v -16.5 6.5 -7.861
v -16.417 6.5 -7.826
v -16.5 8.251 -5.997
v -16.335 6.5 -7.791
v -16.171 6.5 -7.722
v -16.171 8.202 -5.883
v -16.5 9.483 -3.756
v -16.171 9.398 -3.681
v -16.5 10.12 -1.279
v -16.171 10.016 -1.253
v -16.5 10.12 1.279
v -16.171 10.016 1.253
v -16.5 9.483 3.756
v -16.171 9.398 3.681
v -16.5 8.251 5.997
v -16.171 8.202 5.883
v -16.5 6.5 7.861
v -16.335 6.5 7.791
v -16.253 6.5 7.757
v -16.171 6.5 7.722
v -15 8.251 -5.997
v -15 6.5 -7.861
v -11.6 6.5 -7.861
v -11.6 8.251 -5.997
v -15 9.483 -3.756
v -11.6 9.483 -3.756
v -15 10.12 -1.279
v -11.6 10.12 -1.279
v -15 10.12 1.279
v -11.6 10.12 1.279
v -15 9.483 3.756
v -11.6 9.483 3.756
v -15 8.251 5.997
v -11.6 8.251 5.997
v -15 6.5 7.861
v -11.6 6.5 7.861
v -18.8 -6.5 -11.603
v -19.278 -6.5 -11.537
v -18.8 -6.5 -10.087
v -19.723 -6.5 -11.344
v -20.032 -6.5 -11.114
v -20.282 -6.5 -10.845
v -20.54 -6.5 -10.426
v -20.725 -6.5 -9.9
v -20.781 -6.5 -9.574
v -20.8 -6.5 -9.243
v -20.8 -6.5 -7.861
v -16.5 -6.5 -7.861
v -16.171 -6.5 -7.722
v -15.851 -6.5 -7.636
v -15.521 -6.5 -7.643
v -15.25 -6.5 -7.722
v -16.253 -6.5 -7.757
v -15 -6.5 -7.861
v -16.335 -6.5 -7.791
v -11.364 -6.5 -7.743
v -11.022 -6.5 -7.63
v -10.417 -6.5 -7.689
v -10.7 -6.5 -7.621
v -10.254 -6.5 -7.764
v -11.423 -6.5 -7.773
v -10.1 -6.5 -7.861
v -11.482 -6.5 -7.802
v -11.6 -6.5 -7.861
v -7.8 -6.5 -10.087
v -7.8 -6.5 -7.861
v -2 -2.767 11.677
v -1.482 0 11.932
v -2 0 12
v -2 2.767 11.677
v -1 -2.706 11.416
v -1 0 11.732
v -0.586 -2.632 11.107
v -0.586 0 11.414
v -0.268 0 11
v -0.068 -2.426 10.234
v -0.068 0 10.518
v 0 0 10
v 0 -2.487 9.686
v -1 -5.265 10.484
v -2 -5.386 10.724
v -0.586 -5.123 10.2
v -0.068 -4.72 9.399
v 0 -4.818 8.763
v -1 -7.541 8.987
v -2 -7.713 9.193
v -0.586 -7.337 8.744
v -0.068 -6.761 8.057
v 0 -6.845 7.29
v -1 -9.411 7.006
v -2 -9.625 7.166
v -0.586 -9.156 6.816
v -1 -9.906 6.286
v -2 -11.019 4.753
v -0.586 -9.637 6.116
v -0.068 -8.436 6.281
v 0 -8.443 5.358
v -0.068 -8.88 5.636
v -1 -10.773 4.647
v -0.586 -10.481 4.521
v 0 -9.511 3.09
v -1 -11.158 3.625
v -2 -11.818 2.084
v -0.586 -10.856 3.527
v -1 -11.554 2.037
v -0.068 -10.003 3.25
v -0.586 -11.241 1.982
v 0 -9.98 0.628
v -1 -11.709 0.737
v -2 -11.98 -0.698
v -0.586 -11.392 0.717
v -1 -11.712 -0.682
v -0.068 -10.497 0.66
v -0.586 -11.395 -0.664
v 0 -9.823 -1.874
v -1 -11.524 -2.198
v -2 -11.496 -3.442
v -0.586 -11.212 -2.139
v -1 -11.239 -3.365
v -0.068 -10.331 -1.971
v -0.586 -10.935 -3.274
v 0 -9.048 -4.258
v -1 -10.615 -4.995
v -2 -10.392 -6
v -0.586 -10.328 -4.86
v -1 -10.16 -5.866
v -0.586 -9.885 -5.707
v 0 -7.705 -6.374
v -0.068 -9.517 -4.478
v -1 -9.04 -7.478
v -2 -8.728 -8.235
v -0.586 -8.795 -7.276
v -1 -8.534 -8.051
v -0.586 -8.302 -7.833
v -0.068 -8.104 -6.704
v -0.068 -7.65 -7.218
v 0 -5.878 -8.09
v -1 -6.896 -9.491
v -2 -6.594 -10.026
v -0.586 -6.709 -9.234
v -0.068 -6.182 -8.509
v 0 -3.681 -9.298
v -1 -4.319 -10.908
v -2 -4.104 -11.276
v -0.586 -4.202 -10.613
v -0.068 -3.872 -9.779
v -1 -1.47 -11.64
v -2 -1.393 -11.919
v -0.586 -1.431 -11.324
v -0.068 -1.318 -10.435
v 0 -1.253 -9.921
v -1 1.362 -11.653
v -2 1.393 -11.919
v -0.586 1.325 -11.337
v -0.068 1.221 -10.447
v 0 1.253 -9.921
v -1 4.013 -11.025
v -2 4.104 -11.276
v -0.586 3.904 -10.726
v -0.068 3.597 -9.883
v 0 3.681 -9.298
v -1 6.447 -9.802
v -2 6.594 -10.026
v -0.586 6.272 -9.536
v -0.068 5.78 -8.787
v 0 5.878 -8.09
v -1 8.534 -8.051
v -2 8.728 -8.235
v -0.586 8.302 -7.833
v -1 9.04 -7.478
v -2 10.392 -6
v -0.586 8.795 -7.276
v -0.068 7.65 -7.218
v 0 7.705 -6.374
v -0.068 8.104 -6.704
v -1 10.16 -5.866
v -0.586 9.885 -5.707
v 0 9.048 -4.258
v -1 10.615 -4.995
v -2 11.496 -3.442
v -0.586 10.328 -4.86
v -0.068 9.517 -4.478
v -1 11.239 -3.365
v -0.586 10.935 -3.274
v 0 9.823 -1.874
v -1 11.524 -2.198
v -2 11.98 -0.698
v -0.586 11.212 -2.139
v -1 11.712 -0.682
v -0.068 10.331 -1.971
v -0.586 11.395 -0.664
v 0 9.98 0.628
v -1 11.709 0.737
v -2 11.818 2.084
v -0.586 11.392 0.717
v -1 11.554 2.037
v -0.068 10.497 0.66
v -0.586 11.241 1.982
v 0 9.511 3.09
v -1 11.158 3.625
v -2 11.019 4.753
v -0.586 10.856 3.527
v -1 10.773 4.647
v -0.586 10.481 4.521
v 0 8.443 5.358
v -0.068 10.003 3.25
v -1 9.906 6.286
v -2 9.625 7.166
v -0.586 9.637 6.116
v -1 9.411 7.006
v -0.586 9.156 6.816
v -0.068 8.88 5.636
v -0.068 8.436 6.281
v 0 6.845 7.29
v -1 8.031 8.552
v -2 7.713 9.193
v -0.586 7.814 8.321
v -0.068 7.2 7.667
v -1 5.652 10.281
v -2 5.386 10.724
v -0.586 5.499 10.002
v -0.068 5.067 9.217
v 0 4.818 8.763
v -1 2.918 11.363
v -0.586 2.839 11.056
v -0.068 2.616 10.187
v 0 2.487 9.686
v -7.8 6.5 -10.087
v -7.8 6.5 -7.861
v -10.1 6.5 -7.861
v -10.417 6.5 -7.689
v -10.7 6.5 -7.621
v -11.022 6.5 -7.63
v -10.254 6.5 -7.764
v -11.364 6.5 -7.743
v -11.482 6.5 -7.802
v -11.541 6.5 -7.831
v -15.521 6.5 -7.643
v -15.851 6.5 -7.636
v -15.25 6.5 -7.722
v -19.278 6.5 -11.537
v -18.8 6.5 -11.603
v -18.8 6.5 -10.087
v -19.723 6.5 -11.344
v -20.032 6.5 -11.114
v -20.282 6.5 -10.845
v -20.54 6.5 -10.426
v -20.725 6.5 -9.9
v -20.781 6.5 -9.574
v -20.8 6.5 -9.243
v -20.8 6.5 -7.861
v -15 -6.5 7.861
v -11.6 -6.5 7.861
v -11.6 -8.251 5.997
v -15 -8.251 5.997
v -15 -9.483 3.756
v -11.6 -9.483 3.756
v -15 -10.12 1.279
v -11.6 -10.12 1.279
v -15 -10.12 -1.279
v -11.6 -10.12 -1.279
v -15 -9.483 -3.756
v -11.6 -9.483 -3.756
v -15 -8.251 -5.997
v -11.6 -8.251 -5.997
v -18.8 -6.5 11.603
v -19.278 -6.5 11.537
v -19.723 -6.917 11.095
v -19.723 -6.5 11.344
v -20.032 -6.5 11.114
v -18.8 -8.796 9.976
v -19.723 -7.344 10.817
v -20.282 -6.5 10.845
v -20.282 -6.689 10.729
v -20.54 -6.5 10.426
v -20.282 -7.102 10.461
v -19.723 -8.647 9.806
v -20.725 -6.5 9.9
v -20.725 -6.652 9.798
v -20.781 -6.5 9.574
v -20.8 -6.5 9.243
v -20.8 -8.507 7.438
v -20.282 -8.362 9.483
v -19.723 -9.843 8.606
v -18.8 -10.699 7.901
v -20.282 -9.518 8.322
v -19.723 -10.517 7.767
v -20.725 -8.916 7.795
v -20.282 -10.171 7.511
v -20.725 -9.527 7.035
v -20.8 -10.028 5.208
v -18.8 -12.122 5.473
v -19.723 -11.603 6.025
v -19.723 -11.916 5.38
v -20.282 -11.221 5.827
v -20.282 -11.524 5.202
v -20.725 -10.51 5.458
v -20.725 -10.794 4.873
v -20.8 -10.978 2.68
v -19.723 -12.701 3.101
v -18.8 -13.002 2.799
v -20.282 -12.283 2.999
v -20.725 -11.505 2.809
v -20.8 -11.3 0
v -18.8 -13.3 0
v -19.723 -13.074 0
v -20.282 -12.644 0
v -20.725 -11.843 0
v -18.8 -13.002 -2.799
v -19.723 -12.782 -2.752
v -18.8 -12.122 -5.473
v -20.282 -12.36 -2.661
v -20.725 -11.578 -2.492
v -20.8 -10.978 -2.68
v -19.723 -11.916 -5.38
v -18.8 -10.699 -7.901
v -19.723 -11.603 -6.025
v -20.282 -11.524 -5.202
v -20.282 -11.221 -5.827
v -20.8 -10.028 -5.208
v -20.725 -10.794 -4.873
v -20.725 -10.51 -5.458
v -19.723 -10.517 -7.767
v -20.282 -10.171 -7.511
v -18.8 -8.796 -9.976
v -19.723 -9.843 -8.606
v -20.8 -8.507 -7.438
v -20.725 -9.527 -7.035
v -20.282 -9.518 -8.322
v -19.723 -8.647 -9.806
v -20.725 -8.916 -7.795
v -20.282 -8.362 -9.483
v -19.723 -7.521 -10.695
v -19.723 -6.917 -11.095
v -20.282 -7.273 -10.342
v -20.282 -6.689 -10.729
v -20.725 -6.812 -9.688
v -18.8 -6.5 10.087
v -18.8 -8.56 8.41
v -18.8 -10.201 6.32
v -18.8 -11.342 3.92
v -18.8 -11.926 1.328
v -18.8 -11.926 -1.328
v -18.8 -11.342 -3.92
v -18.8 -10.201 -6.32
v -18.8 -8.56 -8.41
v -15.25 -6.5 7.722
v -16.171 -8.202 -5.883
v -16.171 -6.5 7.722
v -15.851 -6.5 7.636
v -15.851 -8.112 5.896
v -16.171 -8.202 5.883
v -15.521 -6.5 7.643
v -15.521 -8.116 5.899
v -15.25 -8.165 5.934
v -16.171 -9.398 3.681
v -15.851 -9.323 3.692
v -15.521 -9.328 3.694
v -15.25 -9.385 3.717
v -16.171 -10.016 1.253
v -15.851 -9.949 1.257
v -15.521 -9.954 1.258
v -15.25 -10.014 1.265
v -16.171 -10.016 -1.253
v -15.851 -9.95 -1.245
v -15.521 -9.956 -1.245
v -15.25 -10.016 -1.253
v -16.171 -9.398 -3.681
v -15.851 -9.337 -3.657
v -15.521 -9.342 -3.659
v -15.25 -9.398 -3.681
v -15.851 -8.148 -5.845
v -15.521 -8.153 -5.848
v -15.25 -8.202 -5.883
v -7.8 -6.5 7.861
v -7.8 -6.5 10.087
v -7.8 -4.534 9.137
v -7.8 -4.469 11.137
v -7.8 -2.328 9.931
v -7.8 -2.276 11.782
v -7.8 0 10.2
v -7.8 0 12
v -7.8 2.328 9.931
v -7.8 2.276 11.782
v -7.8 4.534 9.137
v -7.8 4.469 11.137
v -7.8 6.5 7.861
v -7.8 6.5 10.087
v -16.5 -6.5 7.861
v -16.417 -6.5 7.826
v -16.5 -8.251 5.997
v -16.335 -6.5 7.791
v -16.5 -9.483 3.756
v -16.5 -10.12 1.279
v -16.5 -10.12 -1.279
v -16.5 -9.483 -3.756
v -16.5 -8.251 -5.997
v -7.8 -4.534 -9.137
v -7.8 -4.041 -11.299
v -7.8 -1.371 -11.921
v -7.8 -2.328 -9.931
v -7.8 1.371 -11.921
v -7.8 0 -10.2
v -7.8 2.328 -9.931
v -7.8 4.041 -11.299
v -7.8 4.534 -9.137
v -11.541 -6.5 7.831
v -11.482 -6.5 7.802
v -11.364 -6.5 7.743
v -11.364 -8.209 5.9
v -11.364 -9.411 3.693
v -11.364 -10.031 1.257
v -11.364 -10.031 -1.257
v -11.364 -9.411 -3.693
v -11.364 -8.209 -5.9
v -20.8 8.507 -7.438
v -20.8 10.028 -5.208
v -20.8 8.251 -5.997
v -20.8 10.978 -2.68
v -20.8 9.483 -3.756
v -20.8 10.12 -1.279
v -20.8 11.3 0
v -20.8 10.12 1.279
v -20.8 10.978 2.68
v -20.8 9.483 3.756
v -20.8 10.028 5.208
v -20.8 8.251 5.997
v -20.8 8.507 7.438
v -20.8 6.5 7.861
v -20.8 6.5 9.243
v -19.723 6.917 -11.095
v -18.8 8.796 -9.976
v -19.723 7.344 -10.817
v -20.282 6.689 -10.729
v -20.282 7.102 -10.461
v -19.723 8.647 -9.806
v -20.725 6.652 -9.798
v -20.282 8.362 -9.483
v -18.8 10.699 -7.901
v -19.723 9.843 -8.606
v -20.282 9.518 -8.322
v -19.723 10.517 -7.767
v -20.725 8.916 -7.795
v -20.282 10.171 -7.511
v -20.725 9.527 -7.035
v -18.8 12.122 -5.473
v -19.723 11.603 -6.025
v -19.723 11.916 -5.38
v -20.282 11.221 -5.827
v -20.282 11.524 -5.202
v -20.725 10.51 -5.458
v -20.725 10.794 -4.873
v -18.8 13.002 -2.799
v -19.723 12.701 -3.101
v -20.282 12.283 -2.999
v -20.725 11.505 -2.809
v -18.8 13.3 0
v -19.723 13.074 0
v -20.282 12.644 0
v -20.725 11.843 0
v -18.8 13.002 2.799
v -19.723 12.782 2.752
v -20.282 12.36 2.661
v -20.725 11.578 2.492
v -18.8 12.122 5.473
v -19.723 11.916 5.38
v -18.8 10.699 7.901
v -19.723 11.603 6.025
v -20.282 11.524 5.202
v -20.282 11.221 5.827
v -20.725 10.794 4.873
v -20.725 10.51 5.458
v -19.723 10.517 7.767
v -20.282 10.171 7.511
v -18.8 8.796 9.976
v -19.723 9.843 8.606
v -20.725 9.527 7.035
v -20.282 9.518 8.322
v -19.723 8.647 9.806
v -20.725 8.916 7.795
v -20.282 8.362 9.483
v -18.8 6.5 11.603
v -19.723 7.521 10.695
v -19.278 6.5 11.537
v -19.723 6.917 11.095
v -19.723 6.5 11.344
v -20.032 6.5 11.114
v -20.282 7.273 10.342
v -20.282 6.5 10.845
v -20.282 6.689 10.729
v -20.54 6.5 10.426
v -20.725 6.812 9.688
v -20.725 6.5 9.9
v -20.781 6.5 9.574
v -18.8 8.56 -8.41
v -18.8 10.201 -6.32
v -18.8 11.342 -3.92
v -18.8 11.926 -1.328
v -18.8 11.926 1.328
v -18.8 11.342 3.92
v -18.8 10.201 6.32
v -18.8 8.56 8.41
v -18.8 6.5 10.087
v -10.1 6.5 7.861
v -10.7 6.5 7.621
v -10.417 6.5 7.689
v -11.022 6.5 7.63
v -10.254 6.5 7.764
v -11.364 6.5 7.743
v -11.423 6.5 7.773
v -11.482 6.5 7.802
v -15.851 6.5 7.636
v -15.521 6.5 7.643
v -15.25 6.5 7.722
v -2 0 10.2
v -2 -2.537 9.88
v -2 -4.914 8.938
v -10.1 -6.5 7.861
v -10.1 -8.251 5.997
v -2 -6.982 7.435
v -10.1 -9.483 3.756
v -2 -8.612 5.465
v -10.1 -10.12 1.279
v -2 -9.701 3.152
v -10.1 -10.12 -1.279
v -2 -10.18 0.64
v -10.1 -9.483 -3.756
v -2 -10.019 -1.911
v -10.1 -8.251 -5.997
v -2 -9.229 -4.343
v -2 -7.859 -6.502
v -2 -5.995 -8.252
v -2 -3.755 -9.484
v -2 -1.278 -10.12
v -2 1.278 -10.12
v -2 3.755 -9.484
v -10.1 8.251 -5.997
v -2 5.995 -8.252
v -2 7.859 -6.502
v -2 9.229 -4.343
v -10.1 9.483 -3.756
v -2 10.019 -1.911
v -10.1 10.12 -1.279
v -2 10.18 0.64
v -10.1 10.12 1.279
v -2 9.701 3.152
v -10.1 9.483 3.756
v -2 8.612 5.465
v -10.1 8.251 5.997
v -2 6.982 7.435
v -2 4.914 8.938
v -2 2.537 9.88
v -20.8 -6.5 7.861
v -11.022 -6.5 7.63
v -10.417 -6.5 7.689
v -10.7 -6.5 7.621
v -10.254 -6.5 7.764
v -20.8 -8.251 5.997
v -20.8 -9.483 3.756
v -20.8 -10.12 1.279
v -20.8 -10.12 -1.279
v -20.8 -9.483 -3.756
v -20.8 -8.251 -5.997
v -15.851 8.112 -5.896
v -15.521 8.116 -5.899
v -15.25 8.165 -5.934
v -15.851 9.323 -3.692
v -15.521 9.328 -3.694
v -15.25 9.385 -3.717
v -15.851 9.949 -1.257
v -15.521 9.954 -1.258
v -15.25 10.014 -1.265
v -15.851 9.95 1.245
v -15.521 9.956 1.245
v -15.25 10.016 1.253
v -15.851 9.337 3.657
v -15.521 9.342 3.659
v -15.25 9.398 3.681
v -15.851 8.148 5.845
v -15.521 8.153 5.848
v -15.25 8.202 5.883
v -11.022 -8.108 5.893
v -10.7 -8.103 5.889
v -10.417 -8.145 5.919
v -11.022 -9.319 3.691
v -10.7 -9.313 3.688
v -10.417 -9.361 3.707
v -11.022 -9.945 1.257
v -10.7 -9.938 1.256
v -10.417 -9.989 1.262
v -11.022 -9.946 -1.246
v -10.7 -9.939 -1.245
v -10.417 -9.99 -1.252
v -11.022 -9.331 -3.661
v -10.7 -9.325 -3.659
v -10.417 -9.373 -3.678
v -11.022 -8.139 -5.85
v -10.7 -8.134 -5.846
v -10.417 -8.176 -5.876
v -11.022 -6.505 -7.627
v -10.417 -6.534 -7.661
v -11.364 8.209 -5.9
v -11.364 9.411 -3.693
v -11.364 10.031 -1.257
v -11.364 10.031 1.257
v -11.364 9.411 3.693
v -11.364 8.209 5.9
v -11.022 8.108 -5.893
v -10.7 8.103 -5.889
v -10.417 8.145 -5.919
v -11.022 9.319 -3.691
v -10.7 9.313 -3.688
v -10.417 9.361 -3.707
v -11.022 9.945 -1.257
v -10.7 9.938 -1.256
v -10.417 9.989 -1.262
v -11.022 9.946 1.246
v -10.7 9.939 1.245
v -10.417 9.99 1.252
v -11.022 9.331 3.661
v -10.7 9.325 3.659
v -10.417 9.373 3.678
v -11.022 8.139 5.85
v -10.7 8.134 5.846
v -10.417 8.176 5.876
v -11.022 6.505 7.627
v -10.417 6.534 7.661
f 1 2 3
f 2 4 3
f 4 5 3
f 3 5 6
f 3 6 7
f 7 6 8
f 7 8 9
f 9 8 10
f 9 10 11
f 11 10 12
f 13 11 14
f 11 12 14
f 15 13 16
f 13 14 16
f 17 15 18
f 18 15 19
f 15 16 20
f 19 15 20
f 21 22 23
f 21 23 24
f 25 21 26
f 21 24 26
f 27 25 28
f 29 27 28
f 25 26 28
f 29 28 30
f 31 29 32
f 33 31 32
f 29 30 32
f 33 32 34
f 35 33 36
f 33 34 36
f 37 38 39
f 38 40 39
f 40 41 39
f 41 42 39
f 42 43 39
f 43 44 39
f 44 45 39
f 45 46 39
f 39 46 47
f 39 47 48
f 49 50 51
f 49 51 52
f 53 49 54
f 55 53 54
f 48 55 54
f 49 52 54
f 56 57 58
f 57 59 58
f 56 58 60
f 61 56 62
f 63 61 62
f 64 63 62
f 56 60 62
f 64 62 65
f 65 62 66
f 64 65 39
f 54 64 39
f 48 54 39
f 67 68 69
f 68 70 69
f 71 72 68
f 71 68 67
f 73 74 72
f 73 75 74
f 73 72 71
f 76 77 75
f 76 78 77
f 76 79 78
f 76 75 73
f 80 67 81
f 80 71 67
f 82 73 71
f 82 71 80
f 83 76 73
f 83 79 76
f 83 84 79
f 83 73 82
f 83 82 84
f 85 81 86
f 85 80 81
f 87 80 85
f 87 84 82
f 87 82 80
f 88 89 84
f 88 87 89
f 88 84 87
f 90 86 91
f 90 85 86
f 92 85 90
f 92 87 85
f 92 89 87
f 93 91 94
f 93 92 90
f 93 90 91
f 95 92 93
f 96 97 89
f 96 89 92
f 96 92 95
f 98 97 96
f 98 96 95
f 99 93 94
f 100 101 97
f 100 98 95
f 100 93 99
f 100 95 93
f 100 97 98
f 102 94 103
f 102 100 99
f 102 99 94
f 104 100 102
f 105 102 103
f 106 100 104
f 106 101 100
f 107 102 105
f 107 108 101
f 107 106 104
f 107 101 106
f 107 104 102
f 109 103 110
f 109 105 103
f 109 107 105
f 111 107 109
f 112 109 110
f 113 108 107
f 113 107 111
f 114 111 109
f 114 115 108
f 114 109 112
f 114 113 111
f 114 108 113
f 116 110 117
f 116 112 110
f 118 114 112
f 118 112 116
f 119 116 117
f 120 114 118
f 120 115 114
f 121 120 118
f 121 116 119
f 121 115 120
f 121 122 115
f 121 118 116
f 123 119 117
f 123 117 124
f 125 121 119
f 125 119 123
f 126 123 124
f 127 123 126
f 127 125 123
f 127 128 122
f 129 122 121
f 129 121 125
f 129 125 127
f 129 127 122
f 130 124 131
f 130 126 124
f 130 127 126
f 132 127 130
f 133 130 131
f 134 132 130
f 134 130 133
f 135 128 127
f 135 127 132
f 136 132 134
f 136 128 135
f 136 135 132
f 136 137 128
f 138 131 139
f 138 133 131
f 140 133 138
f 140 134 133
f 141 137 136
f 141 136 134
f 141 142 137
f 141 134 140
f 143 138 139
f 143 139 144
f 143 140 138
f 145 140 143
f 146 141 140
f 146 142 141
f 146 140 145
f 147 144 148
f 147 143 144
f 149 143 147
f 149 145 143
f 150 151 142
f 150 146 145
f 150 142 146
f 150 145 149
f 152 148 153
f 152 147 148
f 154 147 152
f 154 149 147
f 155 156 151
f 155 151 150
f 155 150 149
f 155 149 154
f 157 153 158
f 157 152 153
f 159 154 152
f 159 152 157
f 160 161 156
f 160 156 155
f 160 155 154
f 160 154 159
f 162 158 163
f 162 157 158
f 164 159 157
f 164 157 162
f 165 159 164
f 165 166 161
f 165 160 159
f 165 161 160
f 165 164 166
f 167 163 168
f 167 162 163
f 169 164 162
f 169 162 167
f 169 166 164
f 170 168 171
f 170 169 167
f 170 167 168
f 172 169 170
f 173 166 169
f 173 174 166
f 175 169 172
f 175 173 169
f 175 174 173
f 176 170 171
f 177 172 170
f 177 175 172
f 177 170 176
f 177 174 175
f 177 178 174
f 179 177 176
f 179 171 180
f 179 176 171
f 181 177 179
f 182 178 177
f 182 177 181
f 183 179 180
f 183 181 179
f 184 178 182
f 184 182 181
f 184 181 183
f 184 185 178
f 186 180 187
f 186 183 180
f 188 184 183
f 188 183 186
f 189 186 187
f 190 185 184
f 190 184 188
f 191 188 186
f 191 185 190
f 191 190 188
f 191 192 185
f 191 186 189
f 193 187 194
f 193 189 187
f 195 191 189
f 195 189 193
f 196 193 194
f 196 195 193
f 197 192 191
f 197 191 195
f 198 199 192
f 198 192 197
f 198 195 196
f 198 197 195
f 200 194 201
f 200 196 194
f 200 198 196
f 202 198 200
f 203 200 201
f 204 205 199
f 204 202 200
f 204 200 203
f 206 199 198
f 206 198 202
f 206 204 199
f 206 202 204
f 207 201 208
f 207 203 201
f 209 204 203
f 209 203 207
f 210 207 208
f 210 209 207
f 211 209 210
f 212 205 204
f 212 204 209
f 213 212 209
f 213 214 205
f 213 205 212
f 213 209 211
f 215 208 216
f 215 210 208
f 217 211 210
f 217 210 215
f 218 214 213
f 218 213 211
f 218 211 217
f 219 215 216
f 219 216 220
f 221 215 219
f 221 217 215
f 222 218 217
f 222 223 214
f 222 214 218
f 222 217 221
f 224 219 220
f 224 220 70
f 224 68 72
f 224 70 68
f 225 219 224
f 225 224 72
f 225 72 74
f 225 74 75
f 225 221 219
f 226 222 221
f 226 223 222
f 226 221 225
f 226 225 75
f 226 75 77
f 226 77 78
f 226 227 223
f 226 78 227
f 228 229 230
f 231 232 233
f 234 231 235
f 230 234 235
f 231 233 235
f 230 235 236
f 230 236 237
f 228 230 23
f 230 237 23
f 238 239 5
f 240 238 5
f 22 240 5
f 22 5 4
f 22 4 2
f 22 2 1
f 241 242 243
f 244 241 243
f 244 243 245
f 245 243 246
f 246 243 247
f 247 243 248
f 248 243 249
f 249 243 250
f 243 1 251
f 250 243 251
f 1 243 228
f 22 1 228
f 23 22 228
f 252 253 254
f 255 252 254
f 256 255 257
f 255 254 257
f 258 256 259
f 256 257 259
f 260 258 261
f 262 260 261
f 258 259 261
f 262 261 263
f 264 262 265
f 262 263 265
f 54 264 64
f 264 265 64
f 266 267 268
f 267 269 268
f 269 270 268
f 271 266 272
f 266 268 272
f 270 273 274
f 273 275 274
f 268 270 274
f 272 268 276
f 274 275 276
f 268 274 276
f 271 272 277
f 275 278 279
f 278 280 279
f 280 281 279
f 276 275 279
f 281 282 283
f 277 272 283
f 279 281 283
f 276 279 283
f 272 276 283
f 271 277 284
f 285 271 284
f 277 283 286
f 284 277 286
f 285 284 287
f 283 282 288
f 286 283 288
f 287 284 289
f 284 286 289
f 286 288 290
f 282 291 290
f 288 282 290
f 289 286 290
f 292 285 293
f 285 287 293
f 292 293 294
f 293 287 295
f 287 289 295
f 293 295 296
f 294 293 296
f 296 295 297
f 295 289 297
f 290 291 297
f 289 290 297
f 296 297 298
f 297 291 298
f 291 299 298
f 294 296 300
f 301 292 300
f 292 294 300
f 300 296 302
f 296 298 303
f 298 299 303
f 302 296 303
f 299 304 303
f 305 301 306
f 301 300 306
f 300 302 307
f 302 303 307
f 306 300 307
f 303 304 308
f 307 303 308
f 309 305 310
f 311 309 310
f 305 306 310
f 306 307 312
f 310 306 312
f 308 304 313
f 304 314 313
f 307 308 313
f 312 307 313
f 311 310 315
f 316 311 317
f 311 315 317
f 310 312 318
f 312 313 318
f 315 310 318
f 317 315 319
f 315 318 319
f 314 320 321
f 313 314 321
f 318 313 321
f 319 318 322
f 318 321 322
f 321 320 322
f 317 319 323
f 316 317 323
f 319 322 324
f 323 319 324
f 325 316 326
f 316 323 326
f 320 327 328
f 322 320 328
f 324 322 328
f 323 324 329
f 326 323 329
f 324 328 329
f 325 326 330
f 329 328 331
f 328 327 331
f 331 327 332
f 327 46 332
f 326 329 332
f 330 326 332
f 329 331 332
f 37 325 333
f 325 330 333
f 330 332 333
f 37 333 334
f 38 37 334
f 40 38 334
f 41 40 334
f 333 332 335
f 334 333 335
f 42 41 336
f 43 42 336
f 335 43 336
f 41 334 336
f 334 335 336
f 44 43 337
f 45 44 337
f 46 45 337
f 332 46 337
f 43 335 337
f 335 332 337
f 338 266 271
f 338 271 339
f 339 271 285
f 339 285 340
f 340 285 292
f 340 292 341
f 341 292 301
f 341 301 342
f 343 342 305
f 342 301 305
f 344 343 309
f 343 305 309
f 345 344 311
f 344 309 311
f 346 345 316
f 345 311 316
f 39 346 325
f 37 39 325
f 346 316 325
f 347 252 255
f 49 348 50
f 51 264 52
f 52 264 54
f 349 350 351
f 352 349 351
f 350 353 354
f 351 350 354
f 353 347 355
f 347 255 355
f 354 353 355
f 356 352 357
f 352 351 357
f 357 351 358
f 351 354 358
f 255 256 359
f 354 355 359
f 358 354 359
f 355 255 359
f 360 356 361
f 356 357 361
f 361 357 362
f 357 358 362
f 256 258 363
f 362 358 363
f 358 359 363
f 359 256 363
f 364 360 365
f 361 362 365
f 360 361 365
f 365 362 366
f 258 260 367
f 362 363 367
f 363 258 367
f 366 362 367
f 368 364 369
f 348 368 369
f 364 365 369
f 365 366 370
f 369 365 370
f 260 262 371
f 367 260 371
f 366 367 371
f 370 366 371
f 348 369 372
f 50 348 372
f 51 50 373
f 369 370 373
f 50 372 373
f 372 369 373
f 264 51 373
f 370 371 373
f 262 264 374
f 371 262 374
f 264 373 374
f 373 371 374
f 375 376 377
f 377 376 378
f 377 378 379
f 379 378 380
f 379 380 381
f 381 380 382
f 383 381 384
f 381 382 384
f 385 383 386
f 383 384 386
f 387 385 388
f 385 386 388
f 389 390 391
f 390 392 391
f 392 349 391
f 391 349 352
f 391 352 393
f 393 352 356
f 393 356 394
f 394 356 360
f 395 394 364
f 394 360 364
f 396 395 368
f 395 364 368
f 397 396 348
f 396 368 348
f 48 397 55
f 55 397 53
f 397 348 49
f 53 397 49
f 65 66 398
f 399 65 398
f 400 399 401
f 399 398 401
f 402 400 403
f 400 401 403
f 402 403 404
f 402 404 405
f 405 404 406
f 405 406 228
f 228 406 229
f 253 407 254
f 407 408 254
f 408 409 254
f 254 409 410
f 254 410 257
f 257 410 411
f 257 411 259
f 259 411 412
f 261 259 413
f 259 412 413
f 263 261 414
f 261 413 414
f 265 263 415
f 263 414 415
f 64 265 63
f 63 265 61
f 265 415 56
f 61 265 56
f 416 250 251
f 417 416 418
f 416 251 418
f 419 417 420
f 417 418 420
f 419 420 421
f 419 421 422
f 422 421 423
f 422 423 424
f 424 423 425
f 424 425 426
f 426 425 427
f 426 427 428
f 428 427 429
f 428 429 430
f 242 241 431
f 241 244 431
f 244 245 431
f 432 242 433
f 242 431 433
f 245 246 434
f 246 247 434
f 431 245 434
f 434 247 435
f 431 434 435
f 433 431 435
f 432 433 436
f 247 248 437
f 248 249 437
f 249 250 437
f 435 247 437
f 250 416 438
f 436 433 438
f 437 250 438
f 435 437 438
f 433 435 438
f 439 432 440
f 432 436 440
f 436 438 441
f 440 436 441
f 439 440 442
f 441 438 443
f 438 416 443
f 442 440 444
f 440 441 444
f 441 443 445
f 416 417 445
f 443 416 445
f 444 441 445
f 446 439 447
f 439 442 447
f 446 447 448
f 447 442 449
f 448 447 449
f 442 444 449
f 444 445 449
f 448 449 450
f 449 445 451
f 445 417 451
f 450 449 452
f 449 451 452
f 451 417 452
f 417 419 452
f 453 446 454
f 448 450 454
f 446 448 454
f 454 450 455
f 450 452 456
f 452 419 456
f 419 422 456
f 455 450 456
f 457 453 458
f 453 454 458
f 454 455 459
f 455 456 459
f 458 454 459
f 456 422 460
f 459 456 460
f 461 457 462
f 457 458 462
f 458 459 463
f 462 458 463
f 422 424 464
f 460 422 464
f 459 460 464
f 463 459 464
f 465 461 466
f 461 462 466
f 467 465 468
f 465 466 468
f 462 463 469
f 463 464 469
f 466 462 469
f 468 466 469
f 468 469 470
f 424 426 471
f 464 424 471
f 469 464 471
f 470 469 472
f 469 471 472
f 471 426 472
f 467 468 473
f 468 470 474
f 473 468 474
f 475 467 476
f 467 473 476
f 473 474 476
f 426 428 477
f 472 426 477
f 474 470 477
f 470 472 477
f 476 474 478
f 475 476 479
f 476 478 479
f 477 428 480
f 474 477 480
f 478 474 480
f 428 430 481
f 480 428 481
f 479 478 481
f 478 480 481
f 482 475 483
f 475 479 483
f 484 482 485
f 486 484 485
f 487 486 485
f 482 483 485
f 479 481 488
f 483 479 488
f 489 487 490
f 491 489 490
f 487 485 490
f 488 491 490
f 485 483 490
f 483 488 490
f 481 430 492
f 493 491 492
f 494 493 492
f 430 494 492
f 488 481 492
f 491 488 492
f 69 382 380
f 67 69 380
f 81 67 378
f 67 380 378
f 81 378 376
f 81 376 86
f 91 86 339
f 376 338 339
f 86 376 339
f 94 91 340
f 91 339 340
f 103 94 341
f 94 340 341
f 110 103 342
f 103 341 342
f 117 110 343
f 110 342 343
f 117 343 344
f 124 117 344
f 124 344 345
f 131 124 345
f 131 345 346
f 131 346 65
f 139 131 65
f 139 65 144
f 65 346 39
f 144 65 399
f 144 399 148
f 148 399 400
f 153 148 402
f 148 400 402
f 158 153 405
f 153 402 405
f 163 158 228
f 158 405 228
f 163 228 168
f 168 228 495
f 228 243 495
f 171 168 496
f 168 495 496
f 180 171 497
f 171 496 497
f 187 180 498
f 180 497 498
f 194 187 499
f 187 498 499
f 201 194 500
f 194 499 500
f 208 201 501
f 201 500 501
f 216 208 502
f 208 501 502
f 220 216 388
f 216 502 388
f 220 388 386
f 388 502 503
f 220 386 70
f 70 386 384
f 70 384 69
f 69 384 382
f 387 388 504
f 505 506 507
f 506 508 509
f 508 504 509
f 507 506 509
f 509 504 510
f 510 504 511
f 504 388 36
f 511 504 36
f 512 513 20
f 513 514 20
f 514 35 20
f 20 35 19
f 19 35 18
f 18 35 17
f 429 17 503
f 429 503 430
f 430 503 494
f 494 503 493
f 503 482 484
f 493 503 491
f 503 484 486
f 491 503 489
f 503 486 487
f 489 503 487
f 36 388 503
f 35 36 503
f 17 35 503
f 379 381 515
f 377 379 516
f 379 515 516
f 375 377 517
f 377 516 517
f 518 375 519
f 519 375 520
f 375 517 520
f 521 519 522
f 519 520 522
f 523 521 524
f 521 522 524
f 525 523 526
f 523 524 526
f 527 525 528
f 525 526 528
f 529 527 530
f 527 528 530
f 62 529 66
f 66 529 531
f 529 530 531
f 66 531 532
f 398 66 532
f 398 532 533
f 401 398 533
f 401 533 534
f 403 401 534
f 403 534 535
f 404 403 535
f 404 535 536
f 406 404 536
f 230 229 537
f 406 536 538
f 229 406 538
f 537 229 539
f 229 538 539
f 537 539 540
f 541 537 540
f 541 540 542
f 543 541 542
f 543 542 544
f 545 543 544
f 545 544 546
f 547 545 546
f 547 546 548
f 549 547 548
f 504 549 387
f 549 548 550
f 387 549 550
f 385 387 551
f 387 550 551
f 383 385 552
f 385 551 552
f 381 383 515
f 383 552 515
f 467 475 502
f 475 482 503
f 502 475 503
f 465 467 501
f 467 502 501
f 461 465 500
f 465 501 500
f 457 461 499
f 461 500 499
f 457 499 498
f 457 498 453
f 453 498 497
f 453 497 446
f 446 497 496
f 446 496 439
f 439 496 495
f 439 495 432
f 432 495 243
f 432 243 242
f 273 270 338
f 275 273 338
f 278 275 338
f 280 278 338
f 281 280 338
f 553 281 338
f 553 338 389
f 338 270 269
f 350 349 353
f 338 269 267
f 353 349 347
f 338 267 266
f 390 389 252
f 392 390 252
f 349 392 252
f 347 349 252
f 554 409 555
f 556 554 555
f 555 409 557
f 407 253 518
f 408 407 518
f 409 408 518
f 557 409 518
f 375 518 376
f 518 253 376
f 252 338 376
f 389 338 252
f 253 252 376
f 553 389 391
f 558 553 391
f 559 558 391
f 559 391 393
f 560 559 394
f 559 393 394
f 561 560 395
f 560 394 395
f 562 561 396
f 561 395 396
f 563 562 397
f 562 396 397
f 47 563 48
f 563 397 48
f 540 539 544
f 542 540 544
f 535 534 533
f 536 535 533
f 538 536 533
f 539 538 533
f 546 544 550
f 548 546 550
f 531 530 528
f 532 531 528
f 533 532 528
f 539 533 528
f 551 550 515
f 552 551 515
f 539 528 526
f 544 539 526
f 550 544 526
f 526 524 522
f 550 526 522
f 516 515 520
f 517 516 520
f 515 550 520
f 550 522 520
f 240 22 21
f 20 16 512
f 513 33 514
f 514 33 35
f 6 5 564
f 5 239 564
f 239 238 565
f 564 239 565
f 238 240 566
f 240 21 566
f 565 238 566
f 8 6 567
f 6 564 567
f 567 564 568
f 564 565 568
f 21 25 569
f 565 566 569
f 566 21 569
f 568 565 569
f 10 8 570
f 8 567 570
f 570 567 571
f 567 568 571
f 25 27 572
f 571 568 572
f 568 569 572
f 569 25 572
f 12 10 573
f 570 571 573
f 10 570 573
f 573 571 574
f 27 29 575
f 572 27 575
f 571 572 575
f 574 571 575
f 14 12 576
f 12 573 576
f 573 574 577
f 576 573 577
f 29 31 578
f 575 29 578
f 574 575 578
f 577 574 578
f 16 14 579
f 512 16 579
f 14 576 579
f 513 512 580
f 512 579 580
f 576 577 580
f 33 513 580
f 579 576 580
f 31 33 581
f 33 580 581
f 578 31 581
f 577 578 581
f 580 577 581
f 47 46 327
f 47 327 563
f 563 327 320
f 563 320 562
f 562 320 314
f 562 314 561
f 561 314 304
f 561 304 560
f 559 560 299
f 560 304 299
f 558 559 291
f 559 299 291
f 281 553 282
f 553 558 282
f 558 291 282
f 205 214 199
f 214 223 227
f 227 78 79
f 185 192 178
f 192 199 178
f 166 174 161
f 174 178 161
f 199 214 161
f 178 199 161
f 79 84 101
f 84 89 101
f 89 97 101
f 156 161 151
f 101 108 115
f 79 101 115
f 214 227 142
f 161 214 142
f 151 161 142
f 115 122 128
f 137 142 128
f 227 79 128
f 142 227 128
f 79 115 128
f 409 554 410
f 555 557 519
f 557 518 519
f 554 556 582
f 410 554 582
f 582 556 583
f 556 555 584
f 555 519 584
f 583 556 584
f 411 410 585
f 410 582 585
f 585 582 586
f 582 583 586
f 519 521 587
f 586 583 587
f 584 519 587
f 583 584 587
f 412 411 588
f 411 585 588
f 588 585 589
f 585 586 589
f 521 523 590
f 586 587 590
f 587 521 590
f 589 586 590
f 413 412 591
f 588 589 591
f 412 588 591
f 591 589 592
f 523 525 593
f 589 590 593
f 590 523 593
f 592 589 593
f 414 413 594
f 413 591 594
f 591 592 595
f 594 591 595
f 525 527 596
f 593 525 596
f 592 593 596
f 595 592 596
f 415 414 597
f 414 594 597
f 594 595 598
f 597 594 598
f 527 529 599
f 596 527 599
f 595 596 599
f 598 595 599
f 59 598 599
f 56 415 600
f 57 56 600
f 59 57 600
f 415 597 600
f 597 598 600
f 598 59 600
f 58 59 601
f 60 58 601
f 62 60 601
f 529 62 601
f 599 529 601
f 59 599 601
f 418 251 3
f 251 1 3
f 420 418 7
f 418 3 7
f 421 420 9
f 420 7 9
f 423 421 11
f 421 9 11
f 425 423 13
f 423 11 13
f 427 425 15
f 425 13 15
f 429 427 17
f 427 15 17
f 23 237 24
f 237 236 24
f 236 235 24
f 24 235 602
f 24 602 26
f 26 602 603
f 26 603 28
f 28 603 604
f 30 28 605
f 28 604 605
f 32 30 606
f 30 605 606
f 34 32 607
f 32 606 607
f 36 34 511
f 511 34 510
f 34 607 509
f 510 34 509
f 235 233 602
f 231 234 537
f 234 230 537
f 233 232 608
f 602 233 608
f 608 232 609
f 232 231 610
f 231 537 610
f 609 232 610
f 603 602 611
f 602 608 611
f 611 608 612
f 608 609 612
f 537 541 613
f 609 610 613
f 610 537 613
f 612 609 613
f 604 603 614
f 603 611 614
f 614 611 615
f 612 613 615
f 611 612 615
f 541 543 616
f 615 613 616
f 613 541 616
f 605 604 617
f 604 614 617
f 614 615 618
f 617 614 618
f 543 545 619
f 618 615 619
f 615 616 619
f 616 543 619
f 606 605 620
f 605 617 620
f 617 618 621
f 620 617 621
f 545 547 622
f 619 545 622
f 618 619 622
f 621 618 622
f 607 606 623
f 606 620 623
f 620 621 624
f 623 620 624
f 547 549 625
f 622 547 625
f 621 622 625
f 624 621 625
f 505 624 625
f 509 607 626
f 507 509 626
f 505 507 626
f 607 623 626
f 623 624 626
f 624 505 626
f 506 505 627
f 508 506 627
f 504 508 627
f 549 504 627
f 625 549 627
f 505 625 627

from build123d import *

# Parameters (mm, degrees)
F1_R     = 1.99999
F2_DEPTH = 25
F6_R     = 2


# Not quite as in the source:
# - a fillet or chamfer that OpenCascade refuses, or shapes differently, is made with other operations: its cross-section is extruded or revolved along the edge and cut away or added
# - a fillet or chamfer is up to 0.001 mm smaller than in the source, because OpenCascade refuses the exact size


with BuildPart() as f0:
    # F3 (on Front) → F0 (revolve)
    with BuildSketch(Plane.XZ):
        Polygon((-2, 0), (0, 0), (0, 12), (-18.8, 12), (-18.8, 13.3), (-20.8, 13.3), (-20.8, 10.2), (-16.5, 10.2), (-15, 10.2), (-11.6, 10.2), (-10.1, 10.2), (-2, 10.2), align=None)
        Polygon((-14.9505181851, 9.7), (-15, 10.2), (-16.5, 10.2), align=None)
        Polygon((-10.2909830056, 9.7), (-10.1, 10.2), (-11.6, 10.2), align=None)
    revolve(axis=Axis((-1, 0, 0), (1, 0, 0)))

    # F1 (radius 2 in the source; OpenCascade refuses exactly that, so slightly less here)
    f1_edges = [f0.edges().sort_by_distance(p)[0] for p in [
        (-20.8, 0, -13.3),
    ]]
    fillet(f1_edges, radius=F1_R)

    # F4: fillet of radius 1.5 on 2 edges, made by hand

    # F4_s1 → F4_t2 (revolve, cut)
    with BuildSketch(Plane.XZ):
        with BuildLine():
            ThreePointArc((-16.1707444356, 10.0937530079), (-15.5745304293, 10.0274099354), (-15, 10.2))
            Line((-15, 10.2), (-14.9505181851, 9.7))
            Line((-14.9505181851, 9.7), (-16.1707444356, 10.0937530079))
        make_face()
    revolve(axis=Axis((-14.9505181851, 0, 0), (1, 0, 0)), mode=Mode.SUBTRACT)

    # F4_s3 → F4_t4 (revolve, cut)
    with BuildSketch(Plane.XZ):
        with BuildLine():
            ThreePointArc((-11.3639501712, 10.1098369884), (-10.721986782, 10.0148974609), (-10.1, 10.2))
            Line((-10.1, 10.2), (-10.2909830056, 9.7))
            Line((-10.2909830056, 9.7), (-11.3639501712, 10.1098369884))
        make_face()
    revolve(axis=Axis((-10.2909830056, 0, 0), (1, 0, 0)), mode=Mode.SUBTRACT)

    # F5 (on Top) → F2 (cut, symmetric)
    with BuildSketch(Plane.XY):
        Polygon((-7.8, 6.5), (-30.9797403524, 6.5), (-30.8855128417, -6.5), (-7.8, -6.5), align=None)
    extrude(amount=F2_DEPTH, both=True, mode=Mode.SUBTRACT)

    # F6
    f6_edges = [f0.edges().sort_by_distance(p)[0] for p in [
        (0, 0, -12),
    ]]
    fillet(f6_edges, radius=F6_R)


solid = f0.part
